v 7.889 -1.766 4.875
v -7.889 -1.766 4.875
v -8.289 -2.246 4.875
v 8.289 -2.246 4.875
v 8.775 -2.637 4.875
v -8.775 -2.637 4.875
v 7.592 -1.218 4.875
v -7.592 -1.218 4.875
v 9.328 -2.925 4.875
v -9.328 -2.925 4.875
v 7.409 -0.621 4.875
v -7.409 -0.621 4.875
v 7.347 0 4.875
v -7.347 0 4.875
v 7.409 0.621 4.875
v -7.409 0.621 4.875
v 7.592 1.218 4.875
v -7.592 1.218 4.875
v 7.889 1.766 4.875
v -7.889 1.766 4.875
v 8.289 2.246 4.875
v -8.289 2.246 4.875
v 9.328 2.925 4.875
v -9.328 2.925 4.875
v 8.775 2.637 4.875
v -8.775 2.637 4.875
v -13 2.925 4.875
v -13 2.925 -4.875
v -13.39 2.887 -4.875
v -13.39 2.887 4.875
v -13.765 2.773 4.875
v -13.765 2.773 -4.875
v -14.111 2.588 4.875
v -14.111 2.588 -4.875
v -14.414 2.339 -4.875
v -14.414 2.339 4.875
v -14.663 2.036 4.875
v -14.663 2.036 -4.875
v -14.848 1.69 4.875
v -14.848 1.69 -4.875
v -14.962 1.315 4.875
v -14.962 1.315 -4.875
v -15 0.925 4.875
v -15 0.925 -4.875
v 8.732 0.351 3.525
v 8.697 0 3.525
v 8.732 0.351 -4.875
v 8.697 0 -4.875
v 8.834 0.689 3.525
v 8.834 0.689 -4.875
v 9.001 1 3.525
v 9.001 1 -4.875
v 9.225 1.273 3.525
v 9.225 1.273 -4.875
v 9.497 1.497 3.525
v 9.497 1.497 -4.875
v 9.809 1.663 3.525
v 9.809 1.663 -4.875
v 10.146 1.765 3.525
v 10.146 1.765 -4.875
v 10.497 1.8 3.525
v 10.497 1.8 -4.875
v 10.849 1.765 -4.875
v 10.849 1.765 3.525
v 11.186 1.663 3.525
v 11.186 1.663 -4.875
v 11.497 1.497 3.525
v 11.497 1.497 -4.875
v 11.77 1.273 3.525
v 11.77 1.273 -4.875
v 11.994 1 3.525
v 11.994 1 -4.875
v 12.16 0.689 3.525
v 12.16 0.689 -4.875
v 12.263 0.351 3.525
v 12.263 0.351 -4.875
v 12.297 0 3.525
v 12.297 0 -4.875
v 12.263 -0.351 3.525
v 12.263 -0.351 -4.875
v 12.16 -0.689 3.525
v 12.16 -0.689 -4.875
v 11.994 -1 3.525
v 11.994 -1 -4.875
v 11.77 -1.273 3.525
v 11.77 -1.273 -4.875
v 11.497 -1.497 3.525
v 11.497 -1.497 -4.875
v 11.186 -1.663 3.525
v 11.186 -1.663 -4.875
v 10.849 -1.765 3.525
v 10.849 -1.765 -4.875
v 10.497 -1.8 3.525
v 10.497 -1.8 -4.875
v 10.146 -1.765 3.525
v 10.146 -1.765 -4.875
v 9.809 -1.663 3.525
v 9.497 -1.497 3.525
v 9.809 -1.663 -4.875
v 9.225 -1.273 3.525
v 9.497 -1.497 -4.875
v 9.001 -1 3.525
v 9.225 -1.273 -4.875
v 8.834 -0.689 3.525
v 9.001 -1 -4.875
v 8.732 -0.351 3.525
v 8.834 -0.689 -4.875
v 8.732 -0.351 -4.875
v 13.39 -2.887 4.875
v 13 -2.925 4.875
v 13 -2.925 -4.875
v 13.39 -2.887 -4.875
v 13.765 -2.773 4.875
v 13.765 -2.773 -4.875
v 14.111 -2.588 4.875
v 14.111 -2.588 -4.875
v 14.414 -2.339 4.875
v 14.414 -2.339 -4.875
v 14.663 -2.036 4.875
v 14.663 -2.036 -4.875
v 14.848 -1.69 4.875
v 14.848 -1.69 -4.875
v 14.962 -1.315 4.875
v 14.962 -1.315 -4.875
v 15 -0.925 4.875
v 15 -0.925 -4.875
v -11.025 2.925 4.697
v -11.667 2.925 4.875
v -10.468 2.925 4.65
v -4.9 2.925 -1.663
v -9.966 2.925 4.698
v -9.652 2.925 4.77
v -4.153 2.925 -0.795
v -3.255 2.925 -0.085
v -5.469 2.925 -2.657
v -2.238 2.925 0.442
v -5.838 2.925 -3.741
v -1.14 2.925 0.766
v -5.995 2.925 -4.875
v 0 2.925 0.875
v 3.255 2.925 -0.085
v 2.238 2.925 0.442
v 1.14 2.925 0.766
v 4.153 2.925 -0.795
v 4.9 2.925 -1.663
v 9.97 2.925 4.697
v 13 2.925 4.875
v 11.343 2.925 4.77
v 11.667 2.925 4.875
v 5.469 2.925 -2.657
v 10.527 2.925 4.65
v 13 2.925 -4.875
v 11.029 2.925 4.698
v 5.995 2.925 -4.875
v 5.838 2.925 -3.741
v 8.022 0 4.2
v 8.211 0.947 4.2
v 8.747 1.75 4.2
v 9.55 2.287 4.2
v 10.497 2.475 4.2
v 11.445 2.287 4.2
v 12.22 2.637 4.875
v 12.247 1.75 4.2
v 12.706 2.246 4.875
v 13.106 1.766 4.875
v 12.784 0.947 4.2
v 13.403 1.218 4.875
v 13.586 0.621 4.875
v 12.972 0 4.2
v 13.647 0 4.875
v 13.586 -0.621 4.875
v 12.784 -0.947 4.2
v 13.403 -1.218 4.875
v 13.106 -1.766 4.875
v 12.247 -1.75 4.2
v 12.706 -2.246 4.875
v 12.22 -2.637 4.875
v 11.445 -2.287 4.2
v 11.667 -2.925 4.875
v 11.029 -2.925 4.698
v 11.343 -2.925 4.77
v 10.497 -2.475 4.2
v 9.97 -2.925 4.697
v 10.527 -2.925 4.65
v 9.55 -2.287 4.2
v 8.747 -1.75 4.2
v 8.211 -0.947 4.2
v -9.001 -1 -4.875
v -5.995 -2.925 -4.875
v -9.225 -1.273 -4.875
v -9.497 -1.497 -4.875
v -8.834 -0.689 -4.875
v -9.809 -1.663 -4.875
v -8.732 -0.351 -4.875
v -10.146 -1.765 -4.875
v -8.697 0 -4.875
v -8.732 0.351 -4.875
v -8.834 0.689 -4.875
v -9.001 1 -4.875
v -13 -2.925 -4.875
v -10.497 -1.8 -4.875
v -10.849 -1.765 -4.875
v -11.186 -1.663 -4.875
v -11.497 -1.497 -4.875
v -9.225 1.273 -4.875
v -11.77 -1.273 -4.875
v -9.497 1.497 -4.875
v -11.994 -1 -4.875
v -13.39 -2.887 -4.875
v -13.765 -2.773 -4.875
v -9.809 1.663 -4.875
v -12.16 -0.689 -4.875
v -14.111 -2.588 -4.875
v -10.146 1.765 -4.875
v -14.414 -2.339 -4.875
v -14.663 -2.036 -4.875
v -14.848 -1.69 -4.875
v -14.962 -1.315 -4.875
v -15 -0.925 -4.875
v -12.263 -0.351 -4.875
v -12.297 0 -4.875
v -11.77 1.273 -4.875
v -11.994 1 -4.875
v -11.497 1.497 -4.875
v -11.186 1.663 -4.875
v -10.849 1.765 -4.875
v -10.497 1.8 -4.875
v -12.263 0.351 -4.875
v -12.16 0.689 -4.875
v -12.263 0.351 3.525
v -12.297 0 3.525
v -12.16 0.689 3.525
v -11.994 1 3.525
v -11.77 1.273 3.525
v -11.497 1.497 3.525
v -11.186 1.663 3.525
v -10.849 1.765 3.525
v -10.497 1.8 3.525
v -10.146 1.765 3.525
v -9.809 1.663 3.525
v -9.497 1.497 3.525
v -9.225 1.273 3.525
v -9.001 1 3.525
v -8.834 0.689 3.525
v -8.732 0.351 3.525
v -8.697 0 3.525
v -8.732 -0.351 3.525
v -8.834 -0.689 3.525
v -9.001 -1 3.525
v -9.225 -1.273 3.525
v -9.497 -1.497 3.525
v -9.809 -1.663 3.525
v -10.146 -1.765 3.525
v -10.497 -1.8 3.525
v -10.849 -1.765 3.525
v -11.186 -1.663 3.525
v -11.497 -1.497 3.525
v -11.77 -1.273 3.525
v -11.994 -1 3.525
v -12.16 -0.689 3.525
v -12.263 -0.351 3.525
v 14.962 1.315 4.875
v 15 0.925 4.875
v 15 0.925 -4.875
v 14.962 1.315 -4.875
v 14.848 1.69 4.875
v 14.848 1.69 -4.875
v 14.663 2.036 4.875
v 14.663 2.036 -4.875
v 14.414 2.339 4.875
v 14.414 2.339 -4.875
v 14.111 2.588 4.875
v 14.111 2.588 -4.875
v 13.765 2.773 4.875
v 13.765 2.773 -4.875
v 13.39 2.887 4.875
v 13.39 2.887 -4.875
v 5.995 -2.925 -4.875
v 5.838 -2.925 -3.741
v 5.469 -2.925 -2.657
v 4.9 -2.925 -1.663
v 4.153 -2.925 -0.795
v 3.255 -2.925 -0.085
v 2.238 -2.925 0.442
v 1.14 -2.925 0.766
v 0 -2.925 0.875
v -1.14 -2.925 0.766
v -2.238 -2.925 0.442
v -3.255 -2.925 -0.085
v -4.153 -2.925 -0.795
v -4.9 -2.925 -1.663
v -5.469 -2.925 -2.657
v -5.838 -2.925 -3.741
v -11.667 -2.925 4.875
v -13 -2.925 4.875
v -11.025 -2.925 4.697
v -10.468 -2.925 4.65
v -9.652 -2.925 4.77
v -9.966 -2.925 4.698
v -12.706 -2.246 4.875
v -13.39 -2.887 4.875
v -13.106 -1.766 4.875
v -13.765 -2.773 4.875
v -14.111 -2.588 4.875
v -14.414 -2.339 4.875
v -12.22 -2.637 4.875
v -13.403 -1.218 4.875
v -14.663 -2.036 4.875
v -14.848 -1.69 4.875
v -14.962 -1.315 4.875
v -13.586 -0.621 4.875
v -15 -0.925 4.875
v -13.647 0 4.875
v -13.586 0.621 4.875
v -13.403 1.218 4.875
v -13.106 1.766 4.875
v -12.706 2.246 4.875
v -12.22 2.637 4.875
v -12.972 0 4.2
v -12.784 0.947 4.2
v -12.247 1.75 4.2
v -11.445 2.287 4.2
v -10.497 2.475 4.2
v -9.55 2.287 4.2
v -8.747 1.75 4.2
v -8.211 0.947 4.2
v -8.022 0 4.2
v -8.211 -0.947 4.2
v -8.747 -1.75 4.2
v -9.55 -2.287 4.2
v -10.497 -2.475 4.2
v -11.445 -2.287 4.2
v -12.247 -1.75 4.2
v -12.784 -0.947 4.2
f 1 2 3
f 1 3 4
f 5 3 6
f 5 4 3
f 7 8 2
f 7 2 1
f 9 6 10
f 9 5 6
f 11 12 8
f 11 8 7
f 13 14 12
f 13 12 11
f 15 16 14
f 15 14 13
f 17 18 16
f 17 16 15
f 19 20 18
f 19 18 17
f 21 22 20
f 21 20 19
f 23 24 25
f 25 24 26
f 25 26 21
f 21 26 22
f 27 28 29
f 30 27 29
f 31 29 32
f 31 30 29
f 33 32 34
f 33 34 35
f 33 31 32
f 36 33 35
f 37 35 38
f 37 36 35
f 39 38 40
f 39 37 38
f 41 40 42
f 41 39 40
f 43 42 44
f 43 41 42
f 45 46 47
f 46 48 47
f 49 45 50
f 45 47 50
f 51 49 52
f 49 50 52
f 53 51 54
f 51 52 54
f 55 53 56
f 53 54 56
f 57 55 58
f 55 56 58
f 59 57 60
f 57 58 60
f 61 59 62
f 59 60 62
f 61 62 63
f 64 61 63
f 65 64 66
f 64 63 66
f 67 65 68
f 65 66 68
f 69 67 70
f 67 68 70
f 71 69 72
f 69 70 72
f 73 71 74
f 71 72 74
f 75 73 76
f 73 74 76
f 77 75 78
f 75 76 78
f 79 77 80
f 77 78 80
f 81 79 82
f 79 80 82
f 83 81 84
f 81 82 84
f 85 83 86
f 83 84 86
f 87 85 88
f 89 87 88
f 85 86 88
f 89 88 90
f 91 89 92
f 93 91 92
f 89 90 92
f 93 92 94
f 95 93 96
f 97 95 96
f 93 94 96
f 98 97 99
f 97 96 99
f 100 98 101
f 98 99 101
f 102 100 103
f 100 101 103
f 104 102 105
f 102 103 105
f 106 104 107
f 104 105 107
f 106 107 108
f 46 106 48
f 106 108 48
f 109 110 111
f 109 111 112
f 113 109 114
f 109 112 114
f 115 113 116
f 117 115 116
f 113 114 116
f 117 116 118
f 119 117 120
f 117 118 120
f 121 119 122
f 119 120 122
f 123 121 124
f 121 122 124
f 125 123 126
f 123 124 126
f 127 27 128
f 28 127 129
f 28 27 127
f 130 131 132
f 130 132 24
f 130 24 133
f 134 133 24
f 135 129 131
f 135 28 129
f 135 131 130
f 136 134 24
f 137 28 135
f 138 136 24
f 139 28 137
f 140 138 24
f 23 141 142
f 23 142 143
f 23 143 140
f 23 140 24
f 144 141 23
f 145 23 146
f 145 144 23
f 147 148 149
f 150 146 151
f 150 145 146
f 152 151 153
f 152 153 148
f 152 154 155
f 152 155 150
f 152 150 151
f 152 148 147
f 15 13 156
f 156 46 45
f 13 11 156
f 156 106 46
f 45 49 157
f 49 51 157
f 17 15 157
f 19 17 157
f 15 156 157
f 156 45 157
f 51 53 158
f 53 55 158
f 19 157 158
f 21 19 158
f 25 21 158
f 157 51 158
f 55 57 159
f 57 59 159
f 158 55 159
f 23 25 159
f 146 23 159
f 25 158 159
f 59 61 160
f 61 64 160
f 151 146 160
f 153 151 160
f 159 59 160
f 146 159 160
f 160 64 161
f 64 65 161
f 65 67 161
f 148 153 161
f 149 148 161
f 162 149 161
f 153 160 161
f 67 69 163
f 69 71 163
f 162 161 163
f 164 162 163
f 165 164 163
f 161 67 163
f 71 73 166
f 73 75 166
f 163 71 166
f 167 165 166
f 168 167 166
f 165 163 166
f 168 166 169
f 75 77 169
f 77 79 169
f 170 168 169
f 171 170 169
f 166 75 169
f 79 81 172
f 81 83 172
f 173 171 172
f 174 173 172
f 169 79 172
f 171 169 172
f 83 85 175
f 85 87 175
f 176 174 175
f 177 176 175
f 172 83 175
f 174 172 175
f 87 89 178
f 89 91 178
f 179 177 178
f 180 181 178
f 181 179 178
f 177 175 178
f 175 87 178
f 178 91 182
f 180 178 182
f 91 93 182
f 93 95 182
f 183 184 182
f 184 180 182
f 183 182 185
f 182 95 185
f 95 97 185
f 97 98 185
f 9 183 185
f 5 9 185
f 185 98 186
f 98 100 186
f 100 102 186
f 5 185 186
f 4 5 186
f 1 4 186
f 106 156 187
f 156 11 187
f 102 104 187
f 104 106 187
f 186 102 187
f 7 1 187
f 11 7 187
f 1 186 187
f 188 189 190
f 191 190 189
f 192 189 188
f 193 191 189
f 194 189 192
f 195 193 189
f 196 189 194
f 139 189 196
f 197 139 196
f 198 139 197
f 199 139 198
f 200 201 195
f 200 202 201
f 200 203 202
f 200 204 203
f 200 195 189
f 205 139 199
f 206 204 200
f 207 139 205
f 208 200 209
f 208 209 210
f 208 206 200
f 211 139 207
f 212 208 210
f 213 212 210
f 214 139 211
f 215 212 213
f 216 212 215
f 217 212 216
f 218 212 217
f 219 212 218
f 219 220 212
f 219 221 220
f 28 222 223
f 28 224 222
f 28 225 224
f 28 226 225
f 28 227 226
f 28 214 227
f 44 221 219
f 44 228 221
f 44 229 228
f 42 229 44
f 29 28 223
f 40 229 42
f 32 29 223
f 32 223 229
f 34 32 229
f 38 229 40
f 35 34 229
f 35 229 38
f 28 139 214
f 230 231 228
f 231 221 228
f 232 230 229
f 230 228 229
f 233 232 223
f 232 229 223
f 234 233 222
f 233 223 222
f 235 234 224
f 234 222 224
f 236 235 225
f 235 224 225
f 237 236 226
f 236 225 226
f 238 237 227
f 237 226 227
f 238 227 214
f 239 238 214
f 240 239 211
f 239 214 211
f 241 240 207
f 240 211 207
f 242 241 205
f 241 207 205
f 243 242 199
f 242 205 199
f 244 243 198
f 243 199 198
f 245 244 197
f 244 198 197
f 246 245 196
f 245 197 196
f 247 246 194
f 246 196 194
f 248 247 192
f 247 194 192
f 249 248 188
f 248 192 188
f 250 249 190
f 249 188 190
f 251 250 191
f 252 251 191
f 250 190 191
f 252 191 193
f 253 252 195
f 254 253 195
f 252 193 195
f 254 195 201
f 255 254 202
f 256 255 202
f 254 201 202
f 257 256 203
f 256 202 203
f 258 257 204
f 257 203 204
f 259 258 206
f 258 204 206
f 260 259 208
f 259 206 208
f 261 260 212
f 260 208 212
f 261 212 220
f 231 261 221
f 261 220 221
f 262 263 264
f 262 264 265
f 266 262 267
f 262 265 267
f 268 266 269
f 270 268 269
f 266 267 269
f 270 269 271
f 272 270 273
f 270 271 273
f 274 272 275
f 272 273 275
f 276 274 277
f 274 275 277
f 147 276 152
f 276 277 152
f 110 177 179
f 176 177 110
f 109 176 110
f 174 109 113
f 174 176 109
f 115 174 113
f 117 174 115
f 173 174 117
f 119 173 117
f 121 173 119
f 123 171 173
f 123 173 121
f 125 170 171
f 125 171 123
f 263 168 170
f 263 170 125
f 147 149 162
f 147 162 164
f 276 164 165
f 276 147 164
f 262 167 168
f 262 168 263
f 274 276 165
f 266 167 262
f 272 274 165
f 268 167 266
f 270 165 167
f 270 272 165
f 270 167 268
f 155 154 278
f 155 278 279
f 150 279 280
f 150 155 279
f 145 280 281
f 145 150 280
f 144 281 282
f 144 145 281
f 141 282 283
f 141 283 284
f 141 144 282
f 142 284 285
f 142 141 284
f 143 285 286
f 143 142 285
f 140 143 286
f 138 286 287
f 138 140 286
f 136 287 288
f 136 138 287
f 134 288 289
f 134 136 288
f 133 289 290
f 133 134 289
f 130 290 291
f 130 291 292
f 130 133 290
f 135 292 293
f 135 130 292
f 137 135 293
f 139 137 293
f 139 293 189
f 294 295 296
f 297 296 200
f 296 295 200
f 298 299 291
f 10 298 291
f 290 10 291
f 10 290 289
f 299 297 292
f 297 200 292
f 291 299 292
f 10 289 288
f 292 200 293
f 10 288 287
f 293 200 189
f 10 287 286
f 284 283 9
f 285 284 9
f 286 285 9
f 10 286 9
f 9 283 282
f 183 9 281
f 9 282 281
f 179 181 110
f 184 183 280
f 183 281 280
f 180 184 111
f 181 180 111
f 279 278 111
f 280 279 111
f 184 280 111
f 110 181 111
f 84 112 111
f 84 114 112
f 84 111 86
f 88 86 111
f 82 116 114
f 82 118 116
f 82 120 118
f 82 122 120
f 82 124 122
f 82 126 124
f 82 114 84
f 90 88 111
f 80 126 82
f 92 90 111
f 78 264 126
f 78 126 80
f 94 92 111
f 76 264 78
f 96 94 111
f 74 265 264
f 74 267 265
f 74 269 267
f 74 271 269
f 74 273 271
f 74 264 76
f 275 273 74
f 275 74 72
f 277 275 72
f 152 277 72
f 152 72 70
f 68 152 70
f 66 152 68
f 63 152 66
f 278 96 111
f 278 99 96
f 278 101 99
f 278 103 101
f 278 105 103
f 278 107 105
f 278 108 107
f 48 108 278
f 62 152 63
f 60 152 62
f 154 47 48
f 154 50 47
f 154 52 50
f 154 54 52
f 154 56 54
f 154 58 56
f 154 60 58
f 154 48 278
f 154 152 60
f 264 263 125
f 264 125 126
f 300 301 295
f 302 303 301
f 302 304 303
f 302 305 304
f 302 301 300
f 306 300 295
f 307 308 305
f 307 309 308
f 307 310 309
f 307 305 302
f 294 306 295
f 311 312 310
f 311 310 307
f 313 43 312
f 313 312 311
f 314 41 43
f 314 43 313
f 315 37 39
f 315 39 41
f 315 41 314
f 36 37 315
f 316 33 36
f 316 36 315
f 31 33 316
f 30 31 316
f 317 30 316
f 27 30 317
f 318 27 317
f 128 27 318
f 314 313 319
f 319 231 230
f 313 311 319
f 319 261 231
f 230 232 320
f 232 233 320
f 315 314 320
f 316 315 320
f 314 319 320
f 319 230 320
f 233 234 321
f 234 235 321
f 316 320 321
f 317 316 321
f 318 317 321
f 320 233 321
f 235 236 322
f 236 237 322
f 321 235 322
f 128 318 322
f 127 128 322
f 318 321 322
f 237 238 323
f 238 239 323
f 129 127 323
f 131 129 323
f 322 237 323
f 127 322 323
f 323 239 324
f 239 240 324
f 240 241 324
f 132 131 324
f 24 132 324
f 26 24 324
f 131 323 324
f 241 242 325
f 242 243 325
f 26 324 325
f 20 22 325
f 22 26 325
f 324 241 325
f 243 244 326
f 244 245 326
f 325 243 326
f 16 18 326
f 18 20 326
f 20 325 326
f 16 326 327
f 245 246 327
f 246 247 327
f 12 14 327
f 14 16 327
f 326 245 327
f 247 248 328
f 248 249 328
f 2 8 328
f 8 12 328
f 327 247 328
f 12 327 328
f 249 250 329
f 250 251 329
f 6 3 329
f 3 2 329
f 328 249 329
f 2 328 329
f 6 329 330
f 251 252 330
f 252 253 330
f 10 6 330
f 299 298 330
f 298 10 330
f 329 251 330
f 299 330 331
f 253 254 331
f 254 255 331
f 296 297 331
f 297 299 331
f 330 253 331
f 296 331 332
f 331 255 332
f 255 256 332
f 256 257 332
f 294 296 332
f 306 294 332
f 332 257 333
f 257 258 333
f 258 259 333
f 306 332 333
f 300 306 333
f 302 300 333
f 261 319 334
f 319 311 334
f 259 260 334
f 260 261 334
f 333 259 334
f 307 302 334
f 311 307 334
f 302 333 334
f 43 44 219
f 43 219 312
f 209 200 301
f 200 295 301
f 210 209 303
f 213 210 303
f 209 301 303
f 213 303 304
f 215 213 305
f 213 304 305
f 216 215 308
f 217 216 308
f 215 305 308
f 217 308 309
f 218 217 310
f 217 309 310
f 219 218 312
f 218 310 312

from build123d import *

# Parameters (mm, degrees)
BOSS_EXTRUDE1_DEPTH                             = 2.925
CSK_FOR_M3_FLAT_HEAD_MACHINE_SCREW1_D           = 3.6
CSK_FOR_M3_FLAT_HEAD_MACHINE_SCREW1_CSINK_D     = 6.3
CSK_FOR_M3_FLAT_HEAD_MACHINE_SCREW1_CSINK_ANGLE = 90
FILLET1_R                                       = 2


with BuildPart() as part:
    # Sketch2 → Boss-Extrude1 (new body, symmetric)
    with BuildSketch(Plane(origin=(0, 0, 0), x_dir=(1, 0, 0), z_dir=(0, 1, 0))):
        with BuildLine():
            Line((-15, -4.875), (15, -4.875))
            Line((15, -4.875), (15, 4.875))
            Line((15, 4.875), (5.994789404, 4.875))
            ThreePointArc((5.994789404, 4.875), (0, -0.875), (-5.994789404, 4.875))
            Line((-5.994789404, 4.875), (-15, 4.875))
            Line((-15, 4.875), (-15, -4.875))
        make_face()
    extrude(amount=BOSS_EXTRUDE1_DEPTH, both=True)

    # CSK for M3 Flat Head Machine Screw1 (through all)
    with Locations(Plane.XY.offset(4.875)):
        with Locations((-10.497394702, 0), (10.497394702, 0)):
            CounterSinkHole(CSK_FOR_M3_FLAT_HEAD_MACHINE_SCREW1_D / 2, CSK_FOR_M3_FLAT_HEAD_MACHINE_SCREW1_CSINK_D / 2, counter_sink_angle=CSK_FOR_M3_FLAT_HEAD_MACHINE_SCREW1_CSINK_ANGLE)

    # Fillet1
    fillet1_edges = [part.edges().sort_by_distance(p)[0] for p in [
        (-15, 2.925, 0),
        (15, 2.925, 0),
        (15, -2.925, 0),
        (-15, -2.925, 0),
    ]]
    fillet(fillet1_edges, radius=FILLET1_R)


solid = part.part
